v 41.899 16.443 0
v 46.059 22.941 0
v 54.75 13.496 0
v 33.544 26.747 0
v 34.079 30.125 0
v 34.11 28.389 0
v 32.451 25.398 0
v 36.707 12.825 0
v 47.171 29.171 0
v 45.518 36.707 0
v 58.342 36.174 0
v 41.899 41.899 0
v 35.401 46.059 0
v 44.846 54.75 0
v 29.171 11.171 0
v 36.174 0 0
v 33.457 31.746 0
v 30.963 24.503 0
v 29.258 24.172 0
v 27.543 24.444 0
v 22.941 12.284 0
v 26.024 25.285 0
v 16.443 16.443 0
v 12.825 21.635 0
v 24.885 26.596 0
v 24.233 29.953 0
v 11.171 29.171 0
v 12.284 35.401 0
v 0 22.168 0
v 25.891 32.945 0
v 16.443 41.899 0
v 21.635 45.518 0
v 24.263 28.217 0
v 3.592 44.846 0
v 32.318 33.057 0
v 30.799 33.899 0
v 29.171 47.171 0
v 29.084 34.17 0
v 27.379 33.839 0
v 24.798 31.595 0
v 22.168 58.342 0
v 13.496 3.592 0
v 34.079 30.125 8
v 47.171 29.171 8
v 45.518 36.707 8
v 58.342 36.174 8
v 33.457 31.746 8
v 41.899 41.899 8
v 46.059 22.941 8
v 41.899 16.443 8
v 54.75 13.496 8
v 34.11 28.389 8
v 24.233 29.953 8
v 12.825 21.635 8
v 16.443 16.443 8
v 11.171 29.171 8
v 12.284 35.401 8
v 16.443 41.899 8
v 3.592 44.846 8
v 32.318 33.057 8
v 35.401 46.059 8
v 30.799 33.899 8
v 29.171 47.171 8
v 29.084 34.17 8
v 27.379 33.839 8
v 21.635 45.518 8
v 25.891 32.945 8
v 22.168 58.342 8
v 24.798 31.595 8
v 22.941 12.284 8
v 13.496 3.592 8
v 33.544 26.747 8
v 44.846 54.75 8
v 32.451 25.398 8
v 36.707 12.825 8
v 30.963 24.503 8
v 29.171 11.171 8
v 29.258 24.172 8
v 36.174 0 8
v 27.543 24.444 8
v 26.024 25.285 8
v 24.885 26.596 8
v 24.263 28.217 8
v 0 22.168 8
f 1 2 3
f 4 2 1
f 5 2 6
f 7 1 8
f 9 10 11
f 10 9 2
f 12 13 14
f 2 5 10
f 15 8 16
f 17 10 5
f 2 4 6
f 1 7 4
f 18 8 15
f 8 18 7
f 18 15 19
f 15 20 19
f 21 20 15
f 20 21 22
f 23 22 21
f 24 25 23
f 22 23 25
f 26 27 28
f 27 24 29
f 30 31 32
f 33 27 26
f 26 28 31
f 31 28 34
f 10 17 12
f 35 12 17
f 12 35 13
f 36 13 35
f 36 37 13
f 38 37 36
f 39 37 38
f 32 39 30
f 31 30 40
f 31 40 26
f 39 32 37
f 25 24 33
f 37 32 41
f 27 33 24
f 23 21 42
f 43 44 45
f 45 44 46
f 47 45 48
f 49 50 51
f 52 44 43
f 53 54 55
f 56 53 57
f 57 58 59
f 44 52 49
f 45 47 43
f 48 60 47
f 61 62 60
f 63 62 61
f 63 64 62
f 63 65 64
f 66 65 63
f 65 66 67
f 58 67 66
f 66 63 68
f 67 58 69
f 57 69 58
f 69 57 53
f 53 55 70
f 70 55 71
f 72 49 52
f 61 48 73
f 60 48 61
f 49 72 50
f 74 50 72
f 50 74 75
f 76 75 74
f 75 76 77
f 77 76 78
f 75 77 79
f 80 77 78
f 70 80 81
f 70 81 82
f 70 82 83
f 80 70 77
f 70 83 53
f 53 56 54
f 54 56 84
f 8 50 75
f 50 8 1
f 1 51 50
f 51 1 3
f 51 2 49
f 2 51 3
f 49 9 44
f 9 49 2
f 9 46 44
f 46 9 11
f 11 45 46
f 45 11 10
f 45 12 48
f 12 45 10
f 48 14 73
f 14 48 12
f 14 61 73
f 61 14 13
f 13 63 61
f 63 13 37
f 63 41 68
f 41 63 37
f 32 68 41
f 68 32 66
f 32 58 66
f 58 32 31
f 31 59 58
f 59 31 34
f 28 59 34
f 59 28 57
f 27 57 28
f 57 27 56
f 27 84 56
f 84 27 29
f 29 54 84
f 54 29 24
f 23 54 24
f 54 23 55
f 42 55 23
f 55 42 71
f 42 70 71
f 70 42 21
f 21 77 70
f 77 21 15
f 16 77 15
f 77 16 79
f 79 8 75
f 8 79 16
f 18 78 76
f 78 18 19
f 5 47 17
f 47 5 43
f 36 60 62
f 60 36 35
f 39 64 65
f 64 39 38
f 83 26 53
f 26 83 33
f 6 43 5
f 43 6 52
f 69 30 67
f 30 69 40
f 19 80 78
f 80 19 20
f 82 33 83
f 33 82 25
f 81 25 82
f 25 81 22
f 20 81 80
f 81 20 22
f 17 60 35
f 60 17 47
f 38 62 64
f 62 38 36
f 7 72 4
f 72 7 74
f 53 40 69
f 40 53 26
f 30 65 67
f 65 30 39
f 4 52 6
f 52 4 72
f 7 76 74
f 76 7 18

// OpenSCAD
$fn = 32;

// ----------------------------------------------------------------------
// Star wheel: 8-point ratchet, R30
// ----------------------------------------------------------------------

// --- parameters (mm) ---
n_points = 8;             // number of points / teeth
r_out = 30;               // tip radius
r_in = 18;                // root radius
bore_r = 5;               // centre bore radius
plate_t = 8;              // plate thickness, Z (extrusion height)
bore_d = 10;              // centre bore diameter

profile = [[29.171, 47.171], [22.168, 58.342], [21.635, 45.518], [16.443, 41.899], [3.592, 44.846], [12.284, 35.401], [11.171, 29.171], [0, 22.168], [12.825, 21.635], [16.443, 16.443], [13.496, 3.592], [22.941, 12.284], [29.171, 11.171], [36.174, 0], [36.707, 12.825], [41.899, 16.443], [54.75, 13.496], [46.059, 22.941], [47.171, 29.171], [58.342, 36.174], [45.518, 36.707], [41.899, 41.899], [44.846, 54.75], [35.401, 46.059]];  // primary outline, 24 points, counter clockwise
void_1 = [[34.079, 30.125], [33.457, 31.746], [32.318, 33.057], [30.799, 33.899], [29.084, 34.17], [27.379, 33.839], [25.891, 32.945], [24.798, 31.595], [24.233, 29.953], [24.263, 28.217], [24.885, 26.596], [26.024, 25.285], [27.543, 24.444], [29.258, 24.172], [30.963, 24.503], [32.451, 25.398], [33.544, 26.747], [34.11, 28.389]];  // centre bore, 18 points

// --- the one profile operation ---
difference() {
  linear_extrude(height = plate_t) polygon(points = profile);
  translate([0, 0, -1])
    linear_extrude(height = plate_t + 2) polygon(points = void_1);
}
